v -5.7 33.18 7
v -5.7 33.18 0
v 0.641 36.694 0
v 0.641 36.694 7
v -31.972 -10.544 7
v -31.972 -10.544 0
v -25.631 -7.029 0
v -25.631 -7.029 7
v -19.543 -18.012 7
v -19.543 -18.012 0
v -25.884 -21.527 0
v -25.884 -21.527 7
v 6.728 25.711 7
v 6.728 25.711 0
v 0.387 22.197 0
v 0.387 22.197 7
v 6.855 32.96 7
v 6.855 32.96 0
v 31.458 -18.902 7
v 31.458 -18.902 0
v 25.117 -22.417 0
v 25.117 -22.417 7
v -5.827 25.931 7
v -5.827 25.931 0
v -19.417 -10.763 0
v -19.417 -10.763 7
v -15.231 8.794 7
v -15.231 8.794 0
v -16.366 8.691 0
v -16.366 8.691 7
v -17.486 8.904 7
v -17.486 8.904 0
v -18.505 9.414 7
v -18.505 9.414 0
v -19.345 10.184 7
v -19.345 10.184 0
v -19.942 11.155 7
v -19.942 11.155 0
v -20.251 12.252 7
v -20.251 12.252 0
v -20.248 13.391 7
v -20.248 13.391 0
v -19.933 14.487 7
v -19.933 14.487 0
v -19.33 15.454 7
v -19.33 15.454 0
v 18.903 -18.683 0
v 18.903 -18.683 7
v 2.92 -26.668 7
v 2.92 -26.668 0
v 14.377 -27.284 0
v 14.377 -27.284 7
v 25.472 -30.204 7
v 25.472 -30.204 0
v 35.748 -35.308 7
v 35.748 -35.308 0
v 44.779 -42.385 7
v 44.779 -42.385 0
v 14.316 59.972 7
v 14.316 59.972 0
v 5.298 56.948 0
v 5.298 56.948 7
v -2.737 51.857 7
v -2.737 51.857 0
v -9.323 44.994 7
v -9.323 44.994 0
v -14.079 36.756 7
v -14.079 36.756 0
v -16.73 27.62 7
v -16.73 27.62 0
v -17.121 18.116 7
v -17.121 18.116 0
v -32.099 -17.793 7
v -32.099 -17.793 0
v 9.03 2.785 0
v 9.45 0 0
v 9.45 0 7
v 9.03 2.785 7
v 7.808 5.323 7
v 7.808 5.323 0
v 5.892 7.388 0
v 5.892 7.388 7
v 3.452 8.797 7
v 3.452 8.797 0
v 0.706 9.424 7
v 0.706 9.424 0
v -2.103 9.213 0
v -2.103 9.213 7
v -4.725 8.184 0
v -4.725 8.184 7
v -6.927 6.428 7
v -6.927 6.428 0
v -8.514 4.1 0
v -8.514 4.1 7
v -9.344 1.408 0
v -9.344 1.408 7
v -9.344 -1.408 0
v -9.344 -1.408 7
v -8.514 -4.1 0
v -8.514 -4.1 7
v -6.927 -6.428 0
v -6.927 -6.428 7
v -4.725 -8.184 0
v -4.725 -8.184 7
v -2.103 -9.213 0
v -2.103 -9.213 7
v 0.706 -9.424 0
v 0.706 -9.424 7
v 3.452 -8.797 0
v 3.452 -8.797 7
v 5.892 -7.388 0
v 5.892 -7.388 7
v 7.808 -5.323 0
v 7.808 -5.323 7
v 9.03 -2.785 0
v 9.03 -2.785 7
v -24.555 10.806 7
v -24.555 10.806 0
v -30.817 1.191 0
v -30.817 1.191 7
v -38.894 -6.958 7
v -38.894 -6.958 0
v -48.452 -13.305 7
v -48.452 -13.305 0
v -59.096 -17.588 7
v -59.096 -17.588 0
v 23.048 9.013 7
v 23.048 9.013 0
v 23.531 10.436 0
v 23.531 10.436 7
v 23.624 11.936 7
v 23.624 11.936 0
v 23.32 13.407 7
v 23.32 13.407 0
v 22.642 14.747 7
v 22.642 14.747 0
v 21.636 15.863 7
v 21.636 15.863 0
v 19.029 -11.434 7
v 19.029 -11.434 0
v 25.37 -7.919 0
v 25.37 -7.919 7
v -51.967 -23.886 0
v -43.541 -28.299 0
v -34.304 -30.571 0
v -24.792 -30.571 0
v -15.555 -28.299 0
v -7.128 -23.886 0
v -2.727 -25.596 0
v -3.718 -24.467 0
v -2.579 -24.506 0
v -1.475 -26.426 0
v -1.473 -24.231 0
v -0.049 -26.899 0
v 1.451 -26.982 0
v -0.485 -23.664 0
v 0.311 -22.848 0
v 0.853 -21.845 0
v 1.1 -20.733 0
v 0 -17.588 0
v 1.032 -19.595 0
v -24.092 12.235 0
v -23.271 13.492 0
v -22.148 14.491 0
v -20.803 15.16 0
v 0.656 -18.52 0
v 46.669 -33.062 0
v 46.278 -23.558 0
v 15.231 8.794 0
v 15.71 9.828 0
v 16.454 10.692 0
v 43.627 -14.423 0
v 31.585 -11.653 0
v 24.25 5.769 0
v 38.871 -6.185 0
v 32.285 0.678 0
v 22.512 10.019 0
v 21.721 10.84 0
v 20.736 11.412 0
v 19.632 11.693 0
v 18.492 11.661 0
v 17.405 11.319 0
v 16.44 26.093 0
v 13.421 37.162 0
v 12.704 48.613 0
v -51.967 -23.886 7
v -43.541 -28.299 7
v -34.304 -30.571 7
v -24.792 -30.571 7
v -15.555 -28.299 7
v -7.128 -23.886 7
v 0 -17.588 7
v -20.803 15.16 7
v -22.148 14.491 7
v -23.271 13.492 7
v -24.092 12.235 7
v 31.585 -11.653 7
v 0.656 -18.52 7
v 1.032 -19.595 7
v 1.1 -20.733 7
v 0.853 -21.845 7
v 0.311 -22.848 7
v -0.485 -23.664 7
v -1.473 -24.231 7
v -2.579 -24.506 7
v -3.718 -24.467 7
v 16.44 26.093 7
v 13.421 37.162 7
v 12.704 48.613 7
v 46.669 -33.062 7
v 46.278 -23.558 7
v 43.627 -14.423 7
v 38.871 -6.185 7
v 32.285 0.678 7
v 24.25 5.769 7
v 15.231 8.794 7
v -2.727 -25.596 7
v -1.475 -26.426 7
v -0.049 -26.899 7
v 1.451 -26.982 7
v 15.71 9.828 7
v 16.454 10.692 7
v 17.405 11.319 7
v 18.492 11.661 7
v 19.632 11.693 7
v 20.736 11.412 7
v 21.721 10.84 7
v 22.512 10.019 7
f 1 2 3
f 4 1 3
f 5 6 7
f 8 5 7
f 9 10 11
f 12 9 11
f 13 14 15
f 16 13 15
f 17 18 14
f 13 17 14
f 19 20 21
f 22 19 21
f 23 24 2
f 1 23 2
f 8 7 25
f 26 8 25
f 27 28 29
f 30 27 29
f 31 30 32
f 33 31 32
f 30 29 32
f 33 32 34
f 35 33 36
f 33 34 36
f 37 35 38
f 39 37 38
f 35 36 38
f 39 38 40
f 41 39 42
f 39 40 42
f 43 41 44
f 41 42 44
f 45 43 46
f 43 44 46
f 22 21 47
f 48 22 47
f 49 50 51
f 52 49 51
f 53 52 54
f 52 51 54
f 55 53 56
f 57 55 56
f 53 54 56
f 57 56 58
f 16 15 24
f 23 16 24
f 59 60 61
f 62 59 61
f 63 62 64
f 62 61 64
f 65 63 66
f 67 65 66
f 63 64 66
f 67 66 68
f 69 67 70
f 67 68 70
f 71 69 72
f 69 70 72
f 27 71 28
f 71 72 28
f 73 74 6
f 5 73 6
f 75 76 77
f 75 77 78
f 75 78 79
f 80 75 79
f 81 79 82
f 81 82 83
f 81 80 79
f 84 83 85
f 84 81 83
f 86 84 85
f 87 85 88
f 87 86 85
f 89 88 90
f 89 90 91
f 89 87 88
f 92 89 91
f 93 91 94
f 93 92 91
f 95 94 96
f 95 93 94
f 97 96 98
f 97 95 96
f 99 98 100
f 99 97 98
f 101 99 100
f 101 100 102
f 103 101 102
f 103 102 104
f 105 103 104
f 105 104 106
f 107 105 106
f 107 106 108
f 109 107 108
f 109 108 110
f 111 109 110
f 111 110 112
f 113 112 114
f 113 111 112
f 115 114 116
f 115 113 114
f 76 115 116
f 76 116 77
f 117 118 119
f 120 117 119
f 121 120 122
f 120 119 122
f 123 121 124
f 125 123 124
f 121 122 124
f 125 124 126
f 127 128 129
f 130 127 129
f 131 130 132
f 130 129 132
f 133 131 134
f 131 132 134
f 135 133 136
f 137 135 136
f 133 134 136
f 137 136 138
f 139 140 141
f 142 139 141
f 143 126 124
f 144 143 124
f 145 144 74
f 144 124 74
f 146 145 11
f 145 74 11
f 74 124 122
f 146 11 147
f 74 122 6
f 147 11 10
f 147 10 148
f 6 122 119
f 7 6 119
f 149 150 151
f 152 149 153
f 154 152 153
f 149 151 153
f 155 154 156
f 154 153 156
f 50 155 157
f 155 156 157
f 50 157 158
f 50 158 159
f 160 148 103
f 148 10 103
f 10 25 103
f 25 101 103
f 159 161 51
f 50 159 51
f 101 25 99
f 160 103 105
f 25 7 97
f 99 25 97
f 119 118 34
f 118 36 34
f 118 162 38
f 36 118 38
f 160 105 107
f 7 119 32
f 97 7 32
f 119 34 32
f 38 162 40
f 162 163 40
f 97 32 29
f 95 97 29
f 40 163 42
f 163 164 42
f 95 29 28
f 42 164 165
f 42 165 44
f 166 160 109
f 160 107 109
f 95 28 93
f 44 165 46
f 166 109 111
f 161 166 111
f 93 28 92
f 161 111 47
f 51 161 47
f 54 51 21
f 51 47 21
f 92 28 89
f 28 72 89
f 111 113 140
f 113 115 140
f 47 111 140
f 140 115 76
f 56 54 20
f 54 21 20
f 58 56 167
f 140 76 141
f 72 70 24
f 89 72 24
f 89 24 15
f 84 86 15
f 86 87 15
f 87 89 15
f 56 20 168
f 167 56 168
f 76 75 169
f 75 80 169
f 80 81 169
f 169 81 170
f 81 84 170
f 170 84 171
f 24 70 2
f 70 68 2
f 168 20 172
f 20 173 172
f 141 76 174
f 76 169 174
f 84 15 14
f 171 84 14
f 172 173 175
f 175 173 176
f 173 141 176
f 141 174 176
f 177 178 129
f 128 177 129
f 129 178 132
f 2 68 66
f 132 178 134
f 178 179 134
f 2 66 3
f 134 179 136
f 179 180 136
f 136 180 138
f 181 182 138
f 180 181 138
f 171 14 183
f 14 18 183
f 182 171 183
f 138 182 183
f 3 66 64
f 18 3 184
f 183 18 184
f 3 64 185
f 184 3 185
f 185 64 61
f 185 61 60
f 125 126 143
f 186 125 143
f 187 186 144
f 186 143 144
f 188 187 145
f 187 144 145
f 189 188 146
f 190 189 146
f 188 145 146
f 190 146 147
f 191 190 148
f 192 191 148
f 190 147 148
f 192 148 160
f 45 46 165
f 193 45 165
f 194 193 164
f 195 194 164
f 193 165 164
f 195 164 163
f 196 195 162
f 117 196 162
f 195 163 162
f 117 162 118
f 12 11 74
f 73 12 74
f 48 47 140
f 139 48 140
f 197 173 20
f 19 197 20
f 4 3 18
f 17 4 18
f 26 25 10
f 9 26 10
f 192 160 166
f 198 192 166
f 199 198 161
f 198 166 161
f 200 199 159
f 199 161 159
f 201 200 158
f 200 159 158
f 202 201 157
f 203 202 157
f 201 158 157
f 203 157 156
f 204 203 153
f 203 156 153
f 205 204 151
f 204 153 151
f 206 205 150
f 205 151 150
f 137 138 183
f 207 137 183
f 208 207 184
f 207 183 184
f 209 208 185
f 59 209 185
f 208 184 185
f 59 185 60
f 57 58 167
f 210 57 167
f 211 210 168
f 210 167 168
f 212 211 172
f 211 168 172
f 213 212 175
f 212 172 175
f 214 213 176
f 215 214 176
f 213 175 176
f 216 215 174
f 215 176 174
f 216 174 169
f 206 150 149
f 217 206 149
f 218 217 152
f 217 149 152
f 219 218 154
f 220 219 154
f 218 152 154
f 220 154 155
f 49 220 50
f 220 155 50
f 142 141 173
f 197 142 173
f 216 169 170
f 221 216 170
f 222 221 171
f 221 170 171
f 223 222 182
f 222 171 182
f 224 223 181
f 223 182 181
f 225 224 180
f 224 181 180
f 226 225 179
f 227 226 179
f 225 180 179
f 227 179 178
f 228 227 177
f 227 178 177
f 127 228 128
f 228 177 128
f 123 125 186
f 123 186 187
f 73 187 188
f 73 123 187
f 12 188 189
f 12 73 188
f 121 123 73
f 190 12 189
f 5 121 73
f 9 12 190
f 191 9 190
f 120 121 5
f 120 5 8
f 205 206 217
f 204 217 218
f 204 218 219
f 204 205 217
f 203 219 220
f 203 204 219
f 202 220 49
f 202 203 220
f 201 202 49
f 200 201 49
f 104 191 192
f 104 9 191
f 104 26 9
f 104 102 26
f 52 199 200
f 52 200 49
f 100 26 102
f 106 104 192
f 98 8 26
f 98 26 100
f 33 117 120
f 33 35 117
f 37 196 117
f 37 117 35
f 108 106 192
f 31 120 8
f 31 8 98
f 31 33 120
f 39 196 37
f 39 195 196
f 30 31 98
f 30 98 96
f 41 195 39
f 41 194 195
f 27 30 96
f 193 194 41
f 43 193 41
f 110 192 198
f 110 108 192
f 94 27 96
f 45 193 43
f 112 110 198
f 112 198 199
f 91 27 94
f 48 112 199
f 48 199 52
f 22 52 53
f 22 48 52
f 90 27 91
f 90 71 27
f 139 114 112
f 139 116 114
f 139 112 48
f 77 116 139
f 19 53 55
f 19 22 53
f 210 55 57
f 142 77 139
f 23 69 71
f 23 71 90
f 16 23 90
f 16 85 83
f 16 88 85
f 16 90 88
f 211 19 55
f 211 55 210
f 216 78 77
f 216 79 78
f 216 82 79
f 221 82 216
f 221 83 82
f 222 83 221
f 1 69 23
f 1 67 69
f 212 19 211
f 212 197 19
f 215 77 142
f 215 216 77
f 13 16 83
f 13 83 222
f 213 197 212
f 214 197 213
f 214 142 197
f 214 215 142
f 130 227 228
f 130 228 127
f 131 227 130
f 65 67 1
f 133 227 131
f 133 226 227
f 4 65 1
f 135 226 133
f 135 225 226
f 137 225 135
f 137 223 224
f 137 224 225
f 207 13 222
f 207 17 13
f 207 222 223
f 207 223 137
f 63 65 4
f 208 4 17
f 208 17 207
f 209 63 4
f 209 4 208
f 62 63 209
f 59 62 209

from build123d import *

# Parameters (mm, degrees)
F0_R     = 9.45
F1_DEPTH = 7


with BuildPart() as f1:
    # F0 (on Top) → F1 (new body)
    with BuildSketch(Plane.XY):
        with BuildLine():
            ThreePointArc((-24.555476, 10.805503), (-38.89385, -6.957617), (-59.095755, -17.587779))
            ThreePointArc((-59.095755, -17.587779), (-29.547878, -30.85808), (0, -17.587779))
            ThreePointArc((0, -17.587779), (0.616641, -22.365553), (-3.718256, -24.466991))
            ThreePointArc((-3.718256, -24.466991), (-0.778036, -26.710105), (2.919898, -26.668418))
            ThreePointArc((2.919898, -26.668418), (25.472398, -30.204253), (44.779341, -42.384536))
            ThreePointArc((44.779341, -42.384536), (41.49782, -10.160173), (15.231463, 8.79389))
            ThreePointArc((15.231463, 8.79389), (19.060817, 11.716804), (23.048163, 9.013391))
            ThreePointArc((23.048163, 9.013391), (23.520647, 12.681254), (21.635578, 15.862915))
            ThreePointArc((21.635578, 15.862915), (13.421452, 37.16187), (14.316414, 59.972315))
            ThreePointArc((14.316414, 59.972315), (-11.949942, 41.018252), (-15.231463, 8.79389))
            ThreePointArc((-15.231463, 8.79389), (-19.677458, 10.64875), (-19.329907, 15.453599))
            ThreePointArc((-19.329907, 15.453599), (-22.742611, 14.028851), (-24.555476, 10.805503))
        make_face()
        Polygon((-25.88408, -21.526539), (-32.098543, -17.792513), (-31.972013, -10.543617), (-25.63102, -7.028748), (-19.416557, -10.762774), (-19.543087, -18.011669), align=None, mode=Mode.SUBTRACT)
        Circle(F0_R, mode=Mode.SUBTRACT)
        Polygon((31.58457, -11.653002), (31.45804, -18.901897), (25.117047, -22.416767), (18.902584, -18.682741), (19.029114, -11.433845), (25.370107, -7.918976), align=None, mode=Mode.SUBTRACT)
        Polygon((-5.70049, 33.179541), (0.640503, 36.69441), (6.854966, 32.960384), (6.728436, 25.711489), (0.387443, 22.196619), (-5.82702, 25.930645), align=None, mode=Mode.SUBTRACT)
    extrude(amount=F1_DEPTH)


solid = f1.part
